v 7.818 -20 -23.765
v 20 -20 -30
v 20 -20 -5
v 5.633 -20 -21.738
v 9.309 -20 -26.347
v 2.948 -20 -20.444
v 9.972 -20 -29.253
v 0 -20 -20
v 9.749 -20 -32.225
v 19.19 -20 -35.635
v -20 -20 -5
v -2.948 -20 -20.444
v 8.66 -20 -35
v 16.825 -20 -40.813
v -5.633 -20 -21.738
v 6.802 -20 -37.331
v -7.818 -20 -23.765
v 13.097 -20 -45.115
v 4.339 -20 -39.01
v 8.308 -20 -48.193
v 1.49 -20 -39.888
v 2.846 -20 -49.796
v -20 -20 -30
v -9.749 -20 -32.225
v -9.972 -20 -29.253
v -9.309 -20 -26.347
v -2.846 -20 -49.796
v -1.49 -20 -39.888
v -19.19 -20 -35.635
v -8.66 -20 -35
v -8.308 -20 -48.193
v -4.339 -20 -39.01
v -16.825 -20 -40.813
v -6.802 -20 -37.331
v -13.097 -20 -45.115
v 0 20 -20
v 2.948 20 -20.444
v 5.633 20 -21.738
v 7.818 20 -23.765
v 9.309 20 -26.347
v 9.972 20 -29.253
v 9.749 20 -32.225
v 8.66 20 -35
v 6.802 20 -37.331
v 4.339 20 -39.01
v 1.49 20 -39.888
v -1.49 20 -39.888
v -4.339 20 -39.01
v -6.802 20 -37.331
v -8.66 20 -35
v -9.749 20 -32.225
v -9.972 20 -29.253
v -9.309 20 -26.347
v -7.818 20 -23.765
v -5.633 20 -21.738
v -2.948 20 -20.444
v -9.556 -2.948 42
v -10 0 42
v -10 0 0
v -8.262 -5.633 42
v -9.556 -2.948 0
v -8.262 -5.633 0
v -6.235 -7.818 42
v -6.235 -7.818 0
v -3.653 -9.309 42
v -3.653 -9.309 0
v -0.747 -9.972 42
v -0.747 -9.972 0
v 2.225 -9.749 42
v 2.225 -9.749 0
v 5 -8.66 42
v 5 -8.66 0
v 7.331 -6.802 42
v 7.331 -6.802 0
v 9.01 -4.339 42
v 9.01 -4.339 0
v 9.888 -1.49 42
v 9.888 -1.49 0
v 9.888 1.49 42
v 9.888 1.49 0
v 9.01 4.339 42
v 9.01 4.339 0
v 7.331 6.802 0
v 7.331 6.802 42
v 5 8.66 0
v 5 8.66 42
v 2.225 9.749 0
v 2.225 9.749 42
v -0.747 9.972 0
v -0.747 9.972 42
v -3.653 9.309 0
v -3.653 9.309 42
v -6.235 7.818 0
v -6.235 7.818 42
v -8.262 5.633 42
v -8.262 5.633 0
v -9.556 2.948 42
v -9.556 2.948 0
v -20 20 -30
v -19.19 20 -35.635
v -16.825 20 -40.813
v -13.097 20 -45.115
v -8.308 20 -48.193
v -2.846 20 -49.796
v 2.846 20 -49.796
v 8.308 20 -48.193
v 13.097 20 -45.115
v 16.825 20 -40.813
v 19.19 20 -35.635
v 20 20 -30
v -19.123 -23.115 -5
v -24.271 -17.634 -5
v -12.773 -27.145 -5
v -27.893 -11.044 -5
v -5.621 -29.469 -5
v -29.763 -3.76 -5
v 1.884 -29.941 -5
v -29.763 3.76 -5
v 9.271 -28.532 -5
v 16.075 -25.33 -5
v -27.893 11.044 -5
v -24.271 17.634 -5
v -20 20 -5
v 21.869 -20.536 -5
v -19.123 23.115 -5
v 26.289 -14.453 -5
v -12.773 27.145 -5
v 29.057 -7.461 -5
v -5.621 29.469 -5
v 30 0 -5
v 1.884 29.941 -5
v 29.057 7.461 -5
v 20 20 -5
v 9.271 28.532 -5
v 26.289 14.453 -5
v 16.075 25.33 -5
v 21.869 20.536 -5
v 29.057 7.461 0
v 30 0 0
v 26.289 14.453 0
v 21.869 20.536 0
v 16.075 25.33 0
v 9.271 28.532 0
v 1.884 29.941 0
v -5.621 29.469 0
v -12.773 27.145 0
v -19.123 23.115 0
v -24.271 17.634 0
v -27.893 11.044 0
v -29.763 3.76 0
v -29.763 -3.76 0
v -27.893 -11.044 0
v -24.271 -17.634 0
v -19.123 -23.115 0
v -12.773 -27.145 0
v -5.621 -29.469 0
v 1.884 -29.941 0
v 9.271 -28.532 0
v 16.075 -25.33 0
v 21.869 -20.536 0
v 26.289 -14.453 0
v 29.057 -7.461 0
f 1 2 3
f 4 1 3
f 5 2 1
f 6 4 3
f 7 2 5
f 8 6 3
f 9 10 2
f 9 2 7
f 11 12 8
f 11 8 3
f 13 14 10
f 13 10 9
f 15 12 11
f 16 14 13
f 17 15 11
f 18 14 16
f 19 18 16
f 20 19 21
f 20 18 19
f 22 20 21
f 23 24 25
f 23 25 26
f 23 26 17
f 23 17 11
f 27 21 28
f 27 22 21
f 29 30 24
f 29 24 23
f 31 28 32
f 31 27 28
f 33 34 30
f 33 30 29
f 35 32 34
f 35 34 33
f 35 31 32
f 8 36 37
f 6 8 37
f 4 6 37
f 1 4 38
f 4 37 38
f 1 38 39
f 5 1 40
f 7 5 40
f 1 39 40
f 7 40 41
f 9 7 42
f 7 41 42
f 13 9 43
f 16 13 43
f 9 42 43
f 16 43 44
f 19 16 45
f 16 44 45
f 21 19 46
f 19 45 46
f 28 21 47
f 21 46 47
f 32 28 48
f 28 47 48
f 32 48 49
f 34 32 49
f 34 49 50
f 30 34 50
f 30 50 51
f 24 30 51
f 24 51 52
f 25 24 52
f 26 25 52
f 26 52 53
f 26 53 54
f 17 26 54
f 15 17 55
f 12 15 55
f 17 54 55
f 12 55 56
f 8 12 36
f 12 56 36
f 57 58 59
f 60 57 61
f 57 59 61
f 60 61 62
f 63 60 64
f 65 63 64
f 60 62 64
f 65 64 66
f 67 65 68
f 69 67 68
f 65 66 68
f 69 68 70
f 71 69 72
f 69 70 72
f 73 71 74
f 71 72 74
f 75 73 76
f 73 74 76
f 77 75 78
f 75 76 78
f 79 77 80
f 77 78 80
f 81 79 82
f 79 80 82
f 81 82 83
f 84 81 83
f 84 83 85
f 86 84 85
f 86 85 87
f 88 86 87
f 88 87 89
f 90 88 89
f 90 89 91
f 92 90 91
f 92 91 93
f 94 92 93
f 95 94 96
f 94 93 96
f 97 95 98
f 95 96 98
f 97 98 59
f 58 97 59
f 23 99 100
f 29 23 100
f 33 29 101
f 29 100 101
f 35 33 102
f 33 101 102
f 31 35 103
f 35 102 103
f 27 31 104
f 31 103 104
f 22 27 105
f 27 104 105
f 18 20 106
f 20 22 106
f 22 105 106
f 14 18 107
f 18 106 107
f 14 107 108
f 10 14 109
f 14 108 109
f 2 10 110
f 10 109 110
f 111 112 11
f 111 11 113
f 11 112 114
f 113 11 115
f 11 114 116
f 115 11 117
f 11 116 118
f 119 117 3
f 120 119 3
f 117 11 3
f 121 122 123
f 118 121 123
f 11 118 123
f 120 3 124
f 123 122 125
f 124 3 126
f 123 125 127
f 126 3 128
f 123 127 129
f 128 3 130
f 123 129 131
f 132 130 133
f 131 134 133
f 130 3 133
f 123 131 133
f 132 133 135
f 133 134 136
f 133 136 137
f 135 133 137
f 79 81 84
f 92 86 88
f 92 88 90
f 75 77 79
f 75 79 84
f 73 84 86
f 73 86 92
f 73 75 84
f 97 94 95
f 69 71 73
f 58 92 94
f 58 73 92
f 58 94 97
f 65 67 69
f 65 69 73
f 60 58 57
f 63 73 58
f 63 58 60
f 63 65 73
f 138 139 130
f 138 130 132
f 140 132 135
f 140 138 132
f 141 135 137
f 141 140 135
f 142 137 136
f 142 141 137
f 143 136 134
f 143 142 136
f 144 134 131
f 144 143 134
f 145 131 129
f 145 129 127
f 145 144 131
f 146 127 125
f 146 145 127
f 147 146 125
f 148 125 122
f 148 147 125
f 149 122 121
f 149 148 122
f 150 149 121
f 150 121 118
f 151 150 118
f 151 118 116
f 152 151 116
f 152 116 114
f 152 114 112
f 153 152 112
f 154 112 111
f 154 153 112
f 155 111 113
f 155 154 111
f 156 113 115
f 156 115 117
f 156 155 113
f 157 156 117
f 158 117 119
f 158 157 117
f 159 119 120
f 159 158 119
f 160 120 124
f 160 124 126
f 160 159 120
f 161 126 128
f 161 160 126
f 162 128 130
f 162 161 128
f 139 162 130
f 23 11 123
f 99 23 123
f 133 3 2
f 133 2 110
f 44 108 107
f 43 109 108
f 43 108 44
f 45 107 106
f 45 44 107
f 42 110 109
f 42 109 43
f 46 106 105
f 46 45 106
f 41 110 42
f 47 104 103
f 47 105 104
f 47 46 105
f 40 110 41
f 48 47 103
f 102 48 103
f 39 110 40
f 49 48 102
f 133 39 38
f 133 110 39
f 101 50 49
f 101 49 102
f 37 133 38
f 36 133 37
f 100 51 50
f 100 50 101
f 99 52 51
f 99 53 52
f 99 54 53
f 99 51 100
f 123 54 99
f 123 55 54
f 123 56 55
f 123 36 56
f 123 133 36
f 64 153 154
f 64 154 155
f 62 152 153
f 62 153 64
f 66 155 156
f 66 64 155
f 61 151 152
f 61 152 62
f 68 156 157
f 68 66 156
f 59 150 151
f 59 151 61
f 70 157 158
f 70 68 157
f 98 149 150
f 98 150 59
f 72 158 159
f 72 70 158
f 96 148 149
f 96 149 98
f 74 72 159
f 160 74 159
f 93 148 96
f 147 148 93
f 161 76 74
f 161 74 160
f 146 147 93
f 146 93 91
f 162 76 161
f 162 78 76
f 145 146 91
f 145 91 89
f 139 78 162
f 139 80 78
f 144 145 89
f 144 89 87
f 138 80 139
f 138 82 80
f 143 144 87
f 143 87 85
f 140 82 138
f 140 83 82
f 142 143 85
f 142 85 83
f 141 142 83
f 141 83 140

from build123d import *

# Parameters (mm, degrees)
CUFF_STOPPER_SKETCH_R                 = 30
CUFF_STOPPER_EXTRUDE_DEPTH            = 5
CUFF_PIN_SKETCH_R                     = 10
CUFF_PIN_EXTRUDE_DEPTH                = 42
SUPPORT_SKETCH_W                      = 40
SUPPORT_SKETCH_H                      = 40
SUPPORT_EXTRUDE_DEPTH                 = 25
PIN_SUPPORT_EXTRUDE_REACH             = 61.699
PIN_SUPPORT_EXTRUDE_DIRECTION_2_REACH = 61.699
PIN_HOLE_SKETCH_R                     = 10
PIN_HOLE_CUT_DEPTH                    = 40


with BuildPart() as part:
    # Cuff Stopper Sketch → Cuff Stopper Extrude (new body)
    with BuildSketch(Plane.XY):
        Circle(CUFF_STOPPER_SKETCH_R)
    extrude(amount=-CUFF_STOPPER_EXTRUDE_DEPTH)

    # Cuff Pin Sketch → Cuff Pin Extrude (add)
    with BuildSketch(Plane.XY):
        with Locations(Location((0, 0, 0), (0, 0, 180))):
            Circle(CUFF_PIN_SKETCH_R)
    extrude(amount=CUFF_PIN_EXTRUDE_DEPTH)

    # Support Sketch → Support Extrude (add)
    with BuildSketch(Plane(origin=(0, 0, -5), x_dir=(-1, 0, 0), z_dir=(0, 0, -1))):
        Rectangle(SUPPORT_SKETCH_W, SUPPORT_SKETCH_H)
    extrude(amount=SUPPORT_EXTRUDE_DEPTH)

    # Pin Support Extrude: up to this face of the body (flat: up to its plane)
    pin_support_extrude_end = Plane(part.part.faces().sort_by_distance((0, 20, -17.5))[0])
    # Pin Support Sketch → Pin Support Extrude (add, up to the picked face)
    with BuildSketch(Plane(origin=(0, 0, 0), x_dir=(1, 0, 0), z_dir=(0, 1, 0)), mode=Mode.PRIVATE) as pin_support_extrude_sk1:
        with BuildLine():
            Line((20, 30), (-20, 30))
            ThreePointArc((-20, 30), (0, 50), (20, 30))
        make_face()
    pin_support_extrude_tool1 = split(extrude(pin_support_extrude_sk1.sketch, amount=PIN_SUPPORT_EXTRUDE_REACH, mode=Mode.PRIVATE), bisect_by=pin_support_extrude_end, keep=Keep.BOTH, mode=Mode.PRIVATE)
    add(pin_support_extrude_tool1.solids().sort_by(Axis((0, 0, -38.488264), (0, 1, 0)))[0])

    # Pin Support Extrude direction 2: up to this face of the body (flat: up to its plane)
    pin_support_extrude_direction_2_end = Plane(part.part.faces().sort_by_distance((0, -20, -17.5))[0])
    # Pin Support Sketch → Pin Support Extrude direction 2 (add, up to the picked face)
    with BuildSketch(Plane(origin=(0, 0, 0), x_dir=(1, 0, 0), z_dir=(0, 1, 0)), mode=Mode.PRIVATE) as pin_support_extrude_direction_2_sk1:
        with BuildLine():
            Line((20, 30), (-20, 30))
            ThreePointArc((-20, 30), (0, 50), (20, 30))
        make_face()
    pin_support_extrude_direction_2_tool1 = split(extrude(pin_support_extrude_direction_2_sk1.sketch, amount=-PIN_SUPPORT_EXTRUDE_DIRECTION_2_REACH, mode=Mode.PRIVATE), bisect_by=pin_support_extrude_direction_2_end, keep=Keep.BOTH, mode=Mode.PRIVATE)
    add(pin_support_extrude_direction_2_tool1.solids().sort_by(Axis((0, 0, -38.488264), (0, -1, 0)))[0])

    # Pin Hole Sketch → Pin Hole Cut (cut)
    with BuildSketch(Plane(origin=(0, 20, 0), x_dir=(1, 0, 0), z_dir=(0, 1, 0))):
        with Locations(Location((0, 30, 0), (0, 0, 270))):
            Circle(PIN_HOLE_SKETCH_R)
    extrude(amount=-PIN_HOLE_CUT_DEPTH, mode=Mode.SUBTRACT)


solid = part.part
